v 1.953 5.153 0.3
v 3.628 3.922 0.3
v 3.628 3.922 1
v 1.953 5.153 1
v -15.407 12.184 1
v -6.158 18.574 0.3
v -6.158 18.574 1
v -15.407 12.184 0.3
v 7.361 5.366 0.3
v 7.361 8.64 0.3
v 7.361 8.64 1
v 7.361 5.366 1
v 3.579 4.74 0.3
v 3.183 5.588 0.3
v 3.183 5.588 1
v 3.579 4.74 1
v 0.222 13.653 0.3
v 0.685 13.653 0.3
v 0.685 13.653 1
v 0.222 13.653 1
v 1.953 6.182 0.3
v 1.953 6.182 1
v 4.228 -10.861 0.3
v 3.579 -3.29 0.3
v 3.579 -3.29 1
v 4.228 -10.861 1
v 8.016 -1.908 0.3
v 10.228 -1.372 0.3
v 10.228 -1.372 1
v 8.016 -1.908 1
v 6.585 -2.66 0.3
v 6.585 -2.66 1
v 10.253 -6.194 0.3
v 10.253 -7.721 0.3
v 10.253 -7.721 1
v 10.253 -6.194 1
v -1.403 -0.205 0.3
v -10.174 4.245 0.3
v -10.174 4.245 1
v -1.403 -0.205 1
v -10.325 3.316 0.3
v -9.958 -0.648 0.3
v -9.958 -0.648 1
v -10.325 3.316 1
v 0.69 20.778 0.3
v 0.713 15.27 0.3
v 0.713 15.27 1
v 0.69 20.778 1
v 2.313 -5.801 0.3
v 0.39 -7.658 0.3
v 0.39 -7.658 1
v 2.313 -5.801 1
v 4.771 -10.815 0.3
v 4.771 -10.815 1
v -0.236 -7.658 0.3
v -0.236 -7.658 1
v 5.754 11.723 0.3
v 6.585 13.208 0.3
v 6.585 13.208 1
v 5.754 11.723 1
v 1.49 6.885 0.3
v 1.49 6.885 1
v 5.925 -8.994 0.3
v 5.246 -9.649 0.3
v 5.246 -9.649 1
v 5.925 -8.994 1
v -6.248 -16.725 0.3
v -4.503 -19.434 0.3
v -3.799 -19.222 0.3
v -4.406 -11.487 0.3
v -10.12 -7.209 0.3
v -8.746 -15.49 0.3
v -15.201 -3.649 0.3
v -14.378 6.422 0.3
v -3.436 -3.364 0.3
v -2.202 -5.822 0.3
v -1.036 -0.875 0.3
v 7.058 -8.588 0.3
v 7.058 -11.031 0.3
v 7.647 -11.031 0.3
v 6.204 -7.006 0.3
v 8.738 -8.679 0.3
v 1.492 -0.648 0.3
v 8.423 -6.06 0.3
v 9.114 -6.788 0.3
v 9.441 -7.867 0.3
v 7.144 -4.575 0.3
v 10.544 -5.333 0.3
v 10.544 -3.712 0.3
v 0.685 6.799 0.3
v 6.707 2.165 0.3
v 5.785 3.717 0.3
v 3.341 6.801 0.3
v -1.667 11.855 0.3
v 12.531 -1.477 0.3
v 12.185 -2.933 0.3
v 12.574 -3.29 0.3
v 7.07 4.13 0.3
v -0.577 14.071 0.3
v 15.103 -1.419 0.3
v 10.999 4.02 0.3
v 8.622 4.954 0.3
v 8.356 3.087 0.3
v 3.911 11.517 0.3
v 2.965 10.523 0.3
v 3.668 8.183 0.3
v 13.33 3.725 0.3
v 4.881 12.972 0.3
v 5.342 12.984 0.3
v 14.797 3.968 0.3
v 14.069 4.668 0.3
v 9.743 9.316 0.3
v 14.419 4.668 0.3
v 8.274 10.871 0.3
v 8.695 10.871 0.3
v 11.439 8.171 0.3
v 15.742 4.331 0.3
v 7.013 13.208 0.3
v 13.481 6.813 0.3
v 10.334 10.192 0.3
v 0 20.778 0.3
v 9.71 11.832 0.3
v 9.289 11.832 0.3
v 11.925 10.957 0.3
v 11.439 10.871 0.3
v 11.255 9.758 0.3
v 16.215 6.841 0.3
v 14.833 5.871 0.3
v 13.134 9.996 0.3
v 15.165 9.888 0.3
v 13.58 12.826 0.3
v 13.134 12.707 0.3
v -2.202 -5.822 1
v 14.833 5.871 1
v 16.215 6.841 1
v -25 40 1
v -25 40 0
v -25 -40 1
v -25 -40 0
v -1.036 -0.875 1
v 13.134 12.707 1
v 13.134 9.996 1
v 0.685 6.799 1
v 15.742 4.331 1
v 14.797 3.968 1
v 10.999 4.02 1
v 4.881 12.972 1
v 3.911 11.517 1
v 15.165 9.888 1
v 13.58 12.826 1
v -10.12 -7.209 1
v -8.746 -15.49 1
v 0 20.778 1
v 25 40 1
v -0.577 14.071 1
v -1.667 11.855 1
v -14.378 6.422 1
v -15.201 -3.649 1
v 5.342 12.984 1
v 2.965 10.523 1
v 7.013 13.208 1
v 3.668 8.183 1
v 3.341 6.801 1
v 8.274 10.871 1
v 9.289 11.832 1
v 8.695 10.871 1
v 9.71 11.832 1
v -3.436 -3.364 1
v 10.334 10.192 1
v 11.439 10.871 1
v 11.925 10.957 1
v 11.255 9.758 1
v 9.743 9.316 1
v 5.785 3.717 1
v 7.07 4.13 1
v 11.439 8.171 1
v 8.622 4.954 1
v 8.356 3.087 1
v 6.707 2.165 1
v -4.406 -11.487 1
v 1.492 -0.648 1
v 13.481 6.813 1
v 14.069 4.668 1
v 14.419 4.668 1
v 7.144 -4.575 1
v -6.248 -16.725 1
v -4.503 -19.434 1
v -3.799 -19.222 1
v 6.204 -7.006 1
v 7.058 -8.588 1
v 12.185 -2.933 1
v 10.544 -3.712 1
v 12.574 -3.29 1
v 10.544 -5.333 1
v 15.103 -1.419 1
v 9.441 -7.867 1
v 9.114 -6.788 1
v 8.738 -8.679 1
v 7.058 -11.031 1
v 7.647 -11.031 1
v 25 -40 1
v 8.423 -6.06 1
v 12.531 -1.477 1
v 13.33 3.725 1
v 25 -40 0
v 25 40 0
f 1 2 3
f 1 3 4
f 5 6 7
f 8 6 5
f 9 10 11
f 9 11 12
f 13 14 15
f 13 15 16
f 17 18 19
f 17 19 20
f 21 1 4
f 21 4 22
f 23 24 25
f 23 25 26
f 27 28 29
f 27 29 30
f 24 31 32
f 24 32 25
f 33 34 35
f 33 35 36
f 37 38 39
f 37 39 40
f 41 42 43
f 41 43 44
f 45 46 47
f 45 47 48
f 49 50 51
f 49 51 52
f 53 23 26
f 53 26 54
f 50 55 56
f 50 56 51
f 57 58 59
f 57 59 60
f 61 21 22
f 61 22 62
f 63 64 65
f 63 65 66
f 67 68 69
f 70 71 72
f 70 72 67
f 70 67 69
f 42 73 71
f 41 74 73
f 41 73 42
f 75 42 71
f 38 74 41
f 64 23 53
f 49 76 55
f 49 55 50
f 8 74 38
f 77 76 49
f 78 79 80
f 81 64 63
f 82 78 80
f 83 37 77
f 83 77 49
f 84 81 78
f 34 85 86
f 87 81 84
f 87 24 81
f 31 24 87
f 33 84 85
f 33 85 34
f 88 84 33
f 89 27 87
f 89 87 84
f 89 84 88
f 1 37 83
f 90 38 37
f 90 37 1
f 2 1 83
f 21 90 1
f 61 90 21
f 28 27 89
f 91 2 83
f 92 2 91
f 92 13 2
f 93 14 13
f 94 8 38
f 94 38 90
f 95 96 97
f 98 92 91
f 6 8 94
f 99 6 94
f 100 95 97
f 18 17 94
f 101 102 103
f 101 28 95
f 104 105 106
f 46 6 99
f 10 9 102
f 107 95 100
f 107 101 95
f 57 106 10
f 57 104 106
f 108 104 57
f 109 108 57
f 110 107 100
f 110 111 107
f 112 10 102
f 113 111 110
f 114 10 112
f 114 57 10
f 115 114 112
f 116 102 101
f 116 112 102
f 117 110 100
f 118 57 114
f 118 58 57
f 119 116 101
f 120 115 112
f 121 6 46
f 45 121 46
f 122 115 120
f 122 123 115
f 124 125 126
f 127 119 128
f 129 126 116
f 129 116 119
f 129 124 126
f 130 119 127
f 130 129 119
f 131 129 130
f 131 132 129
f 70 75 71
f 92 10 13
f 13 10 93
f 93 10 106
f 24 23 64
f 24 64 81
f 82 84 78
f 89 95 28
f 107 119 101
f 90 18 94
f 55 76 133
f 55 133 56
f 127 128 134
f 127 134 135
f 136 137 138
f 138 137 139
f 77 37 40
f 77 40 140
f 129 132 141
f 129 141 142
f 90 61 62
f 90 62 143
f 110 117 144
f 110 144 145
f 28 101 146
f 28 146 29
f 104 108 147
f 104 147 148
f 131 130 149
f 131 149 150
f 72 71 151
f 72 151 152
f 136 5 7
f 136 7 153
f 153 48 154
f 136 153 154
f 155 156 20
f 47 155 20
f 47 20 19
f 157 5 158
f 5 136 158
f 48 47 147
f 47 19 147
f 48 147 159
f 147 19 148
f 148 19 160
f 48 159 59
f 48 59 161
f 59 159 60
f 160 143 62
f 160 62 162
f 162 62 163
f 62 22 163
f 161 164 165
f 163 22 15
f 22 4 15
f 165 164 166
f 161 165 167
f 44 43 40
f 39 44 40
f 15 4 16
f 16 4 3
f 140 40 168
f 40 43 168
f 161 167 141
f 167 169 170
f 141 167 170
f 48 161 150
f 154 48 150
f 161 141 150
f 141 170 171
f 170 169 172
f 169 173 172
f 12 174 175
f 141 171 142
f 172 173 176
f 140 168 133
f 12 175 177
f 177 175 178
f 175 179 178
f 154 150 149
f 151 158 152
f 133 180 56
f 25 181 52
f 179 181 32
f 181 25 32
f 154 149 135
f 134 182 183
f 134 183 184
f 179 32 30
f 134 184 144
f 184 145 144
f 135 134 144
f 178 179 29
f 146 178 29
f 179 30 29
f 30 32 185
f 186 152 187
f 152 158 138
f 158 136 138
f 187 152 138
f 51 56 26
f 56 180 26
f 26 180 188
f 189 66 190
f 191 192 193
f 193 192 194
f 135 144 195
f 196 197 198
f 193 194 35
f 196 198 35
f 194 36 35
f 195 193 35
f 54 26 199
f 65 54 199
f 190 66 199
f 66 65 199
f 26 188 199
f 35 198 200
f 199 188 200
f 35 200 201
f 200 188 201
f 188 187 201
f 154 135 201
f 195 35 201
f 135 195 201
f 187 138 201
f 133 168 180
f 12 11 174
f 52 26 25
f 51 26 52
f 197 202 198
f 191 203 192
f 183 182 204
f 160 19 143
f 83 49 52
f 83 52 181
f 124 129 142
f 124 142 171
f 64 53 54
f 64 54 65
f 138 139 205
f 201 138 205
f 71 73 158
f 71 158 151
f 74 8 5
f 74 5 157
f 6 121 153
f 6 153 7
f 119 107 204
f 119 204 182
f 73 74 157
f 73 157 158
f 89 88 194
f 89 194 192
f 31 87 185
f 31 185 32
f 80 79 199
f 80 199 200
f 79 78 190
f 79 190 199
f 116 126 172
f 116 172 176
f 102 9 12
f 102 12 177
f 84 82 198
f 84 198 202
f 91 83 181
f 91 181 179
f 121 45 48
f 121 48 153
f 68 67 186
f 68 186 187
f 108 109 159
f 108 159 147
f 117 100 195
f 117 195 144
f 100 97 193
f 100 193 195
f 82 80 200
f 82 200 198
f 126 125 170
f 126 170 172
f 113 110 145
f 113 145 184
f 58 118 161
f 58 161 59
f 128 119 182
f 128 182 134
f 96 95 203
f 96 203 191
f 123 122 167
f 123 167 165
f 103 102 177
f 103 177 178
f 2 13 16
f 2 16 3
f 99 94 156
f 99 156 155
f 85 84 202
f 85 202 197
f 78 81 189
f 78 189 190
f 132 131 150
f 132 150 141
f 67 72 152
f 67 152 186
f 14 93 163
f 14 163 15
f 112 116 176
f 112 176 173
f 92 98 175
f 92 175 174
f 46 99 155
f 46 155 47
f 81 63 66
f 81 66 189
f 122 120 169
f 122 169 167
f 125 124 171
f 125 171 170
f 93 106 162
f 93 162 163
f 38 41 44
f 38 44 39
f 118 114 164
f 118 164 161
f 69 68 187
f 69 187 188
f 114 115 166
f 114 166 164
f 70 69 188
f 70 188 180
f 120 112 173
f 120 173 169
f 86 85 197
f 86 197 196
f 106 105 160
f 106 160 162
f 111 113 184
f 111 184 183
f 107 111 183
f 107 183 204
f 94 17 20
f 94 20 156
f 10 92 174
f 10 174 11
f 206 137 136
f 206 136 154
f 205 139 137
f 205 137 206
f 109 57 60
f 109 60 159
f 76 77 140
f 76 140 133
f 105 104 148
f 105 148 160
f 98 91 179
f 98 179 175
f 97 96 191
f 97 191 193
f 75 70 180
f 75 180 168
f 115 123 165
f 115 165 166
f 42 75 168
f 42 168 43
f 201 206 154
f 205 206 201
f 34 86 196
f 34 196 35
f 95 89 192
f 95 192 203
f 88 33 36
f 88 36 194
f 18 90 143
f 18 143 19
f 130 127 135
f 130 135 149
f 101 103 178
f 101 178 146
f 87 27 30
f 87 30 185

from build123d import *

# Parameters (mm, degrees)
F1_DEPTH = 0.3
F2_W     = 50
F2_H     = 80
F3_DEPTH = 1


with BuildPart() as f1:
    # F0 (on Top) → F1 (new body)
    with BuildSketch(Plane.XY):
        Polygon((0.712675, 15.270151), (0.690062, 20.777893), (0, 20.777893), (-6.158038, 18.574403), (-15.406642, 12.183537), (-14.377871, 6.422419), (-15.201324, -3.648944), (-10.119598, -7.209389), (-8.745982, -15.490465), (-6.2484, -16.724988), (-4.502518, -19.434085), (-3.799315, -19.222107), (-4.405524, -11.486877), (-3.435589, -3.363675), (-9.958401, -0.647857), (-10.324874, 3.315877), (-10.173654, 4.244799), (-1.402901, -0.205386), (-1.035653, -0.875074), (-2.202206, -5.822124), (-0.236348, -7.658365), (0.390134, -7.658365), (2.312787, -5.800521), (1.491879, -0.647857), (6.706654, 2.165446), (7.070379, 4.129564), (5.785215, 3.717342), (7.361359, 8.639761), (7.361359, 5.366231), (8.622275, 4.954008), (8.355541, 3.086884), (10.998614, 4.020446), (10.228239, -1.372148), (8.016065, -1.90828), (7.144242, -4.575033), (6.585411, -2.659979), (3.578614, -3.290436), (4.227621, -10.86133), (4.771292, -10.814724), (5.246052, -9.648911), (5.925006, -8.994205), (6.203862, -7.005839), (7.057673, -8.588474), (7.057673, -11.031068), (7.64664, -11.031068), (8.737817, -8.678976), (8.422588, -6.060153), (9.113666, -6.787604), (9.441019, -7.866656), (10.25334, -7.721166), (10.25334, -6.193519), (10.54432, -5.332702), (10.54432, -3.712002), (12.530581, -1.477186), (12.184544, -2.933421), (12.573835, -3.290436), (15.10281, -1.418724), (15.742388, 4.331473), (14.796702, 3.967747), (14.418927, 4.667996), (14.069251, 4.667996), (13.329675, 3.725264), (13.4809, 6.812778), (14.833075, 5.871244), (16.21523, 6.841179), (15.165069, 9.887992), (13.579787, 12.826489), (13.134402, 12.707163), (13.134402, 9.996007), (11.924642, 10.957333), (11.438578, 10.870922), (11.254954, 9.758375), (11.438578, 8.170567), (9.742755, 9.315517), (10.334263, 10.191618), (9.710351, 11.832248), (9.289096, 11.832248), (8.695018, 10.870922), (8.273762, 10.870922), (7.013025, 13.207839), (6.585411, 13.207839), (5.753823, 11.723072), (5.341601, 12.983987), (4.880882, 12.971863), (3.910947, 11.516961), (2.965261, 10.522777), (3.668464, 8.18281), (3.341111, 6.800653), (3.183496, 5.588235), (3.578614, 4.739542), (3.627767, 3.922476), (1.953327, 5.153279), (1.953327, 6.18205), (1.49038, 6.885044), (0.684509, 6.799313), (0.684509, 13.653399), (0.222199, 13.653399), (-1.667038, 11.85499), (-0.577093, 14.071212), align=None)
    extrude(amount=F1_DEPTH)

    # F2 (on face) → F3 (join)
    with BuildSketch(Plane(origin=(0, 0, 0), x_dir=(1, 0, 0), z_dir=(0, 0, -1))):
        Rectangle(F2_W, F2_H)
        Polygon((0.712675, -15.270151), (0.690062, -20.777893), (0, -20.777893), (-6.158038, -18.574403), (-15.406642, -12.183537), (-14.377871, -6.422419), (-15.201324, 3.648944), (-10.119598, 7.209389), (-8.745982, 15.490465), (-6.2484, 16.724988), (-4.502518, 19.434085), (-3.799315, 19.222107), (-4.405524, 11.486877), (-3.435589, 3.363675), (-9.958401, 0.647857), (-10.324874, -3.315877), (-10.173654, -4.244799), (-1.402901, 0.205386), (-1.035653, 0.875074), (-2.202206, 5.822124), (-0.236348, 7.658365), (0.390134, 7.658365), (2.312787, 5.800521), (1.491879, 0.647857), (6.706654, -2.165446), (7.070379, -4.129564), (5.785215, -3.717342), (7.361359, -8.639761), (7.361359, -5.366231), (8.622275, -4.954008), (8.355541, -3.086884), (10.998614, -4.020446), (10.228239, 1.372148), (8.016065, 1.90828), (7.144242, 4.575033), (6.585411, 2.659979), (3.578614, 3.290436), (4.227621, 10.86133), (4.771292, 10.814724), (5.246052, 9.648911), (5.925006, 8.994205), (6.203862, 7.005839), (7.057673, 8.588474), (7.057673, 11.031068), (7.64664, 11.031068), (8.737817, 8.678976), (8.422588, 6.060153), (9.113666, 6.787604), (9.441019, 7.866656), (10.25334, 7.721166), (10.25334, 6.193519), (10.54432, 5.332702), (10.54432, 3.712002), (12.530581, 1.477186), (12.184544, 2.933421), (12.573835, 3.290436), (15.10281, 1.418724), (15.742388, -4.331473), (14.796702, -3.967747), (14.418927, -4.667996), (14.069251, -4.667996), (13.329675, -3.725264), (13.4809, -6.812778), (14.833075, -5.871244), (16.21523, -6.841179), (15.165069, -9.887992), (13.579787, -12.826489), (13.134402, -12.707163), (13.134402, -9.996007), (11.924642, -10.957333), (11.438578, -10.870922), (11.254954, -9.758375), (11.438578, -8.170567), (9.742755, -9.315517), (10.334263, -10.191618), (9.710351, -11.832248), (9.289096, -11.832248), (8.695018, -10.870922), (8.273762, -10.870922), (7.013025, -13.207839), (6.585411, -13.207839), (5.753823, -11.723072), (5.341601, -12.983987), (4.880882, -12.971863), (3.910947, -11.516961), (2.965261, -10.522777), (3.668464, -8.18281), (3.341111, -6.800653), (3.183496, -5.588235), (3.578614, -4.739542), (3.627767, -3.922476), (1.953327, -5.153279), (1.953327, -6.18205), (1.49038, -6.885044), (0.684509, -6.799313), (0.684509, -13.653399), (0.222199, -13.653399), (-1.667038, -11.85499), (-0.577093, -14.071212), align=None, mode=Mode.SUBTRACT)
    extrude(amount=-F3_DEPTH)


solid = f1.part
